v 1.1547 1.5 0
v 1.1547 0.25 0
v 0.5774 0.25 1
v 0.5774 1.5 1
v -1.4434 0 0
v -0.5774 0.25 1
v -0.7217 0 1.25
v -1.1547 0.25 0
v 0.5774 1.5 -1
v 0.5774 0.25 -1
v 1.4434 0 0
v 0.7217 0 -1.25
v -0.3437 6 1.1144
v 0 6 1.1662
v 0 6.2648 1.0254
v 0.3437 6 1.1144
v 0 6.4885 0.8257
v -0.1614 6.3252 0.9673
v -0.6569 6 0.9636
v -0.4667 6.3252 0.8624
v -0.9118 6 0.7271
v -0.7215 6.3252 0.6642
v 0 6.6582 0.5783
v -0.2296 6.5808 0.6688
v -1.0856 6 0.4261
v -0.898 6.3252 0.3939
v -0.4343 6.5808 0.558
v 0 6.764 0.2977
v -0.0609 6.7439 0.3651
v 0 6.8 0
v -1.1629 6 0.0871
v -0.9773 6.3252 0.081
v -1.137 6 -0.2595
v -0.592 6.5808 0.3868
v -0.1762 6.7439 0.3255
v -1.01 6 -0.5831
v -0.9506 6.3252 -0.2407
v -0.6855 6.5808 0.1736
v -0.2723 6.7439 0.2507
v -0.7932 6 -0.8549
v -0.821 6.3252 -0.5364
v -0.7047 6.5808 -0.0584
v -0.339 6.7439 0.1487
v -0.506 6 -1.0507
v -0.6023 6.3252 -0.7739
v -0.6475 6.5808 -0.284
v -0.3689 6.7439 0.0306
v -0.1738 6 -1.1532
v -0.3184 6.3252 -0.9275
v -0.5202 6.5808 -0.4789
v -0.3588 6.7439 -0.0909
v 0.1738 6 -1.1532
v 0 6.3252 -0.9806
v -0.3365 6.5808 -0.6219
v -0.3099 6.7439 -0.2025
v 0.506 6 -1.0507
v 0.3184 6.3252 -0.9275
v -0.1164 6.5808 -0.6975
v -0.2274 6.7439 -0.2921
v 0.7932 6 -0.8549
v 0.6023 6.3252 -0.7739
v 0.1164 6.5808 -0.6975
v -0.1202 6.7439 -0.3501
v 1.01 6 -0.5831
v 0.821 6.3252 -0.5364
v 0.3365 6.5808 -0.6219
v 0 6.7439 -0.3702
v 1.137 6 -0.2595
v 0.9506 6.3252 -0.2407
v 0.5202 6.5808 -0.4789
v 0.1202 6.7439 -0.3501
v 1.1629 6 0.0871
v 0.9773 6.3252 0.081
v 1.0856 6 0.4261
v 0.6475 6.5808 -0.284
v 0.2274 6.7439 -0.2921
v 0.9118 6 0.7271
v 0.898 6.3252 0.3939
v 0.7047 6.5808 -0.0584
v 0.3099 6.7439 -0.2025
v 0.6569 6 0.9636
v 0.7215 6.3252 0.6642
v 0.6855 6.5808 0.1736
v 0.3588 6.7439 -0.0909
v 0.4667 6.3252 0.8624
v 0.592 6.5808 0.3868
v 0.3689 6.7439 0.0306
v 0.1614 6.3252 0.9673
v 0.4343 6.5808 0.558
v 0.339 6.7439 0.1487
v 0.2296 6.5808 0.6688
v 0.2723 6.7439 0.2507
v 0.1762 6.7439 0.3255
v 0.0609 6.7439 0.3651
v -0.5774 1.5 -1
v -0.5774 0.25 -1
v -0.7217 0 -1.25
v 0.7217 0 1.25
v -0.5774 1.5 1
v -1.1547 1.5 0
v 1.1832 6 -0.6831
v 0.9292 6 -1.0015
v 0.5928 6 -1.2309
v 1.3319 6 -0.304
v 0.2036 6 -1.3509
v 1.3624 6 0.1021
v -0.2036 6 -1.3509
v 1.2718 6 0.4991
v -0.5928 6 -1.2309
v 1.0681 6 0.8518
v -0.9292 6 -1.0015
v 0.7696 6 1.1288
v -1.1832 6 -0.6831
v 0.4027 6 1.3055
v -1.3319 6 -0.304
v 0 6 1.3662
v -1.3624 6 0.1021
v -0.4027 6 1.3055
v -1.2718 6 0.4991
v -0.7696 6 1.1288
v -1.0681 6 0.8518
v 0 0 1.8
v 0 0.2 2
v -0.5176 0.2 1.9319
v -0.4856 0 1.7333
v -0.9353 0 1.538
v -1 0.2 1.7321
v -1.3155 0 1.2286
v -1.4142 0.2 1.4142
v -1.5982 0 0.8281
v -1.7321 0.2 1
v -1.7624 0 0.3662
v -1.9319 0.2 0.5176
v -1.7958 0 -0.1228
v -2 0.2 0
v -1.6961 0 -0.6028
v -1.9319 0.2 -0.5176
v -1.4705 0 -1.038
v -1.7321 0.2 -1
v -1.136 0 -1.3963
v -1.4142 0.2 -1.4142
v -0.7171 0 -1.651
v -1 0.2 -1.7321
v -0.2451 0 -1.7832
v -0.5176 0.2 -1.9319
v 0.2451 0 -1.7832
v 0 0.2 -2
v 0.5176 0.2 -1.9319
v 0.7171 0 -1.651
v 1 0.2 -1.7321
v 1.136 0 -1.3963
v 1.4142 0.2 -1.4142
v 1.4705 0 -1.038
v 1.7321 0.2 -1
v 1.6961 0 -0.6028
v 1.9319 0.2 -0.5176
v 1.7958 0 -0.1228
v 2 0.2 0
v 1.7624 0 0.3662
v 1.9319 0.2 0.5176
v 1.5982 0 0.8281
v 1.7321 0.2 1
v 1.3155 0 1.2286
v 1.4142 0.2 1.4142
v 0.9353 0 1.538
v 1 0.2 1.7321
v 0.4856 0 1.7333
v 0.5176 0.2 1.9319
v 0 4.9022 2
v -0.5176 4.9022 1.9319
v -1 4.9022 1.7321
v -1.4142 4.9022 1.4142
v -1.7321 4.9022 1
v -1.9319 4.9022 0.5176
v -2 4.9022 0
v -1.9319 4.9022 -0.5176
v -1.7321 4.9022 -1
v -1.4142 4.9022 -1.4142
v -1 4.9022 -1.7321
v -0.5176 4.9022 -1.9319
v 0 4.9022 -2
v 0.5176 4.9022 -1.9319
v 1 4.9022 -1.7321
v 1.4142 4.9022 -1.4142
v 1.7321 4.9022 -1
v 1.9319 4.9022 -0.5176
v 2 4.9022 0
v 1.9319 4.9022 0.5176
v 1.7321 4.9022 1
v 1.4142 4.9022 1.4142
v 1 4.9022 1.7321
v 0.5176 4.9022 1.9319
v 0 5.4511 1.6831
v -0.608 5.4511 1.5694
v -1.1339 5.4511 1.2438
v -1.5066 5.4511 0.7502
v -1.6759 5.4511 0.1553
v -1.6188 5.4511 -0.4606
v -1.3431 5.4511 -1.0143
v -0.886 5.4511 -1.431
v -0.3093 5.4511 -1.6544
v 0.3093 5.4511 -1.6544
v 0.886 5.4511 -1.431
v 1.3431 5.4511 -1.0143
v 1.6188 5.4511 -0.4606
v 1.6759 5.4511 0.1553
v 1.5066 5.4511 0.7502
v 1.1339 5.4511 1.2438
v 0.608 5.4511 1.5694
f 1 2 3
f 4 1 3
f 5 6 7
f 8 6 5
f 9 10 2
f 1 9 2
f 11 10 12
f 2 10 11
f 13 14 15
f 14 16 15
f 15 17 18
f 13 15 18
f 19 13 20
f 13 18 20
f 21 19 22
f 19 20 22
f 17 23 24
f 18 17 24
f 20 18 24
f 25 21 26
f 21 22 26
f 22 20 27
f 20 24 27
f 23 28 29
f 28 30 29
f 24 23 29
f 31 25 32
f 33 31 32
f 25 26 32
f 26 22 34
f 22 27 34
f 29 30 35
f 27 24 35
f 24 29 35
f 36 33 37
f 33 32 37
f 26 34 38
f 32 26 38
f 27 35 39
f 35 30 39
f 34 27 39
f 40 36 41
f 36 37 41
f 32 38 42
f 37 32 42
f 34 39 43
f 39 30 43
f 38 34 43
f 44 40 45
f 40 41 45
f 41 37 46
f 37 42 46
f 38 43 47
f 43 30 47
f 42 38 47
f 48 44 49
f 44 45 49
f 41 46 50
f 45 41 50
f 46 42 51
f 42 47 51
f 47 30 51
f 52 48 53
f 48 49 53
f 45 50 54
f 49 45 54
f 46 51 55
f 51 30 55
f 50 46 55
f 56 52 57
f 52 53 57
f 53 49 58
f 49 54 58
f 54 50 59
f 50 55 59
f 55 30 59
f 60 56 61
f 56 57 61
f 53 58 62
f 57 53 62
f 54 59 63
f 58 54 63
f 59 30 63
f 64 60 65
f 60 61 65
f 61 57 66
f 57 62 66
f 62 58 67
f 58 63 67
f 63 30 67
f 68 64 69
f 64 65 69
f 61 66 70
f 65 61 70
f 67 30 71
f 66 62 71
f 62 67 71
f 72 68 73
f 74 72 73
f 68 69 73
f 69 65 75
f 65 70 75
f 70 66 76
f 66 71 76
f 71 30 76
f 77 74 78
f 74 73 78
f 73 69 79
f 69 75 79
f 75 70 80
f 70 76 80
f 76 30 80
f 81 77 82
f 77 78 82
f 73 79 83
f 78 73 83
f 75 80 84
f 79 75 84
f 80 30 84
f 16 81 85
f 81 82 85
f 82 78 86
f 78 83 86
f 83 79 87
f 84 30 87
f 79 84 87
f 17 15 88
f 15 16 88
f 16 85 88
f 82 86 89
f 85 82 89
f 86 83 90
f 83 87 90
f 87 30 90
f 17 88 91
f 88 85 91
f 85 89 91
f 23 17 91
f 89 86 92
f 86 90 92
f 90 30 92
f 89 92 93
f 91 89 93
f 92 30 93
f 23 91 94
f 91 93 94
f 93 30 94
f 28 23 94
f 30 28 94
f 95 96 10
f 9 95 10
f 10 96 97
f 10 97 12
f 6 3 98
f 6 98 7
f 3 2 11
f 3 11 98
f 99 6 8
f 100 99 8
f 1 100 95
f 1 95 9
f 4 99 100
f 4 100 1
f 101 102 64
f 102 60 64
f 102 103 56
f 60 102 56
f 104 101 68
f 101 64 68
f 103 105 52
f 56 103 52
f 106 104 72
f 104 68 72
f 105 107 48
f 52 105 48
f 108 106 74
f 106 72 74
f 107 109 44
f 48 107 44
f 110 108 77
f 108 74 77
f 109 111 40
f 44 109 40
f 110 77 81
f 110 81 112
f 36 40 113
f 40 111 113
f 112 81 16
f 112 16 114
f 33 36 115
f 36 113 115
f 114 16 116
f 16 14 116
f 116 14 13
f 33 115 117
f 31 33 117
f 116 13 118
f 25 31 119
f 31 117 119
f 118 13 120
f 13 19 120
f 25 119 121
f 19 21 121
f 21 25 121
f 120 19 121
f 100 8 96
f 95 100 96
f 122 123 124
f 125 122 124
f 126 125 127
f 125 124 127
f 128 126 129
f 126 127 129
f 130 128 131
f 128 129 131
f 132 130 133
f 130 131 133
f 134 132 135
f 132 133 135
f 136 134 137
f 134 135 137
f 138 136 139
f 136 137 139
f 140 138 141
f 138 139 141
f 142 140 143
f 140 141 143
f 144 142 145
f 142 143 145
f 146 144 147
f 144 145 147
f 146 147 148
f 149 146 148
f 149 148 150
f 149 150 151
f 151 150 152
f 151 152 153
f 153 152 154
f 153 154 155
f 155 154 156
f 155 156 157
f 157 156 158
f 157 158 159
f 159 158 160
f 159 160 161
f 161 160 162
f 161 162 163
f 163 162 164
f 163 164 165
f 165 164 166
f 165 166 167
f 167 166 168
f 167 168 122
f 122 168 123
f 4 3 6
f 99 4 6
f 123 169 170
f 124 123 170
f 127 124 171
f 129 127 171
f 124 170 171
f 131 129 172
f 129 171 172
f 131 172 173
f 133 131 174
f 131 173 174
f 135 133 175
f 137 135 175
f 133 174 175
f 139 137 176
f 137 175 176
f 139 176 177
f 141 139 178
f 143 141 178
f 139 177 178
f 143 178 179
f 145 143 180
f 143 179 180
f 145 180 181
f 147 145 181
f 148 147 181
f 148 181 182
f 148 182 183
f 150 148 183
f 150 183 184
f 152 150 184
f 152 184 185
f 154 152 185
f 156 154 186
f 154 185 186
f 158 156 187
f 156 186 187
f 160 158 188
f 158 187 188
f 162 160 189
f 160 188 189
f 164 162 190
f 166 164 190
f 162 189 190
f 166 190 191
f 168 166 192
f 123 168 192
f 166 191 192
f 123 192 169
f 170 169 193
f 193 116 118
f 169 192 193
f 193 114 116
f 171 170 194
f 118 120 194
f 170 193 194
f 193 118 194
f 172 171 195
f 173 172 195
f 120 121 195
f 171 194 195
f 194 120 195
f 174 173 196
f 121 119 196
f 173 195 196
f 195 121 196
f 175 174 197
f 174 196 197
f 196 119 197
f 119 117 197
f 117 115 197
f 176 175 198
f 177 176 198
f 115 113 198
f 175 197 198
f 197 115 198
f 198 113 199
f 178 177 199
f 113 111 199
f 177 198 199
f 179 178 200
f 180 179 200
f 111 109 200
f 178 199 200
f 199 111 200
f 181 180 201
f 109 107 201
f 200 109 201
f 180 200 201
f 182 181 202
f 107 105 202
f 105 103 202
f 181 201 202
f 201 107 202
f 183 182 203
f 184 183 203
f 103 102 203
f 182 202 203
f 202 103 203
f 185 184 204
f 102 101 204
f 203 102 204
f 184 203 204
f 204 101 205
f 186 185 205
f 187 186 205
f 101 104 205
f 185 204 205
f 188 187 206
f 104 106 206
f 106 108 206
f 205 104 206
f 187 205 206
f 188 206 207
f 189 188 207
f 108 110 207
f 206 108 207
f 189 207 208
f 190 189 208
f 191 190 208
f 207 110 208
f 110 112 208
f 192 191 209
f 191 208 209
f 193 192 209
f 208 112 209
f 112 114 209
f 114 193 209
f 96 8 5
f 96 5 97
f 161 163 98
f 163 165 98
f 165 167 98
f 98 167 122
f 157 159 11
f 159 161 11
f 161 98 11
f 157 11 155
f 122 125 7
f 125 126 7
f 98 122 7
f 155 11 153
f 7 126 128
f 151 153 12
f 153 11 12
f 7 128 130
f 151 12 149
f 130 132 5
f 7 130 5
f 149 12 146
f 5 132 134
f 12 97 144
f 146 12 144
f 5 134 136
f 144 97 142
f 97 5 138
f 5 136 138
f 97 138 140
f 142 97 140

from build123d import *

# Parameters (mm, degrees)
CHAMFER_1_SIZE      = 0.2
CUT_EXTRUDE_1_DEPTH = 1.5
CHAMFER_3_SIZE      = 0.25


with BuildPart() as part:
    # Эскиз1 → Повернуть1 (revolve)
    with BuildSketch(Plane.XY, mode=Mode.PRIVATE) as revolve_1_sk:
        with BuildLine():
            Line((0, 0), (-2, 0))
            Line((-2, 0), (-2, 4.902209534))
            Line((-2, 4.902209534), (-1.366190379, 6))
            Line((-1.366190379, 6), (-1.166190379, 6))
            ThreePointArc((-1.166190379, 6), (-0.707106781, 6.580776406), (0, 6.8))
            Line((0, 6.8), (0, 0))
        make_face()
    revolve(revolve_1_sk.sketch.rotate(Axis((0, 6.8, 0), (0, -1, 0)), 270), axis=Axis((0, 6.8, 0), (0, -1, 0)))

    # Фаска1
    chamfer_1_edges = [part.edges().sort_by_distance(p)[0] for p in [
        (0, 0, -2),
    ]]
    chamfer(chamfer_1_edges, length=CHAMFER_1_SIZE)

    # Эскиз2 → Вырез-Вытянуть1 (cut)
    with BuildSketch(Plane.XZ):
        Polygon((1.154700538, 0), (0.577350269, 1), (-0.577350269, 1), (-1.154700538, 0), (-0.577350269, -1), (0.577350269, -1), align=None)
    extrude(amount=-CUT_EXTRUDE_1_DEPTH, mode=Mode.SUBTRACT)

    # Фаска3
    chamfer_3_edges = [part.edges().sort_by_distance(p)[0] for p in [
        (0.8660254037844386, 0, -0.5000000000000002),
        (0.8660254037844386, 0, 0.5000000000000007),
        (0, 0, 1),
        (-0.8660254037844393, 0, 0.5000000000000004),
        (-0.8660254037844393, 0, -0.5000000000000003),
        (0, 0, -1),
    ]]
    chamfer(chamfer_3_edges, length=CHAMFER_3_SIZE)


solid = part.part
